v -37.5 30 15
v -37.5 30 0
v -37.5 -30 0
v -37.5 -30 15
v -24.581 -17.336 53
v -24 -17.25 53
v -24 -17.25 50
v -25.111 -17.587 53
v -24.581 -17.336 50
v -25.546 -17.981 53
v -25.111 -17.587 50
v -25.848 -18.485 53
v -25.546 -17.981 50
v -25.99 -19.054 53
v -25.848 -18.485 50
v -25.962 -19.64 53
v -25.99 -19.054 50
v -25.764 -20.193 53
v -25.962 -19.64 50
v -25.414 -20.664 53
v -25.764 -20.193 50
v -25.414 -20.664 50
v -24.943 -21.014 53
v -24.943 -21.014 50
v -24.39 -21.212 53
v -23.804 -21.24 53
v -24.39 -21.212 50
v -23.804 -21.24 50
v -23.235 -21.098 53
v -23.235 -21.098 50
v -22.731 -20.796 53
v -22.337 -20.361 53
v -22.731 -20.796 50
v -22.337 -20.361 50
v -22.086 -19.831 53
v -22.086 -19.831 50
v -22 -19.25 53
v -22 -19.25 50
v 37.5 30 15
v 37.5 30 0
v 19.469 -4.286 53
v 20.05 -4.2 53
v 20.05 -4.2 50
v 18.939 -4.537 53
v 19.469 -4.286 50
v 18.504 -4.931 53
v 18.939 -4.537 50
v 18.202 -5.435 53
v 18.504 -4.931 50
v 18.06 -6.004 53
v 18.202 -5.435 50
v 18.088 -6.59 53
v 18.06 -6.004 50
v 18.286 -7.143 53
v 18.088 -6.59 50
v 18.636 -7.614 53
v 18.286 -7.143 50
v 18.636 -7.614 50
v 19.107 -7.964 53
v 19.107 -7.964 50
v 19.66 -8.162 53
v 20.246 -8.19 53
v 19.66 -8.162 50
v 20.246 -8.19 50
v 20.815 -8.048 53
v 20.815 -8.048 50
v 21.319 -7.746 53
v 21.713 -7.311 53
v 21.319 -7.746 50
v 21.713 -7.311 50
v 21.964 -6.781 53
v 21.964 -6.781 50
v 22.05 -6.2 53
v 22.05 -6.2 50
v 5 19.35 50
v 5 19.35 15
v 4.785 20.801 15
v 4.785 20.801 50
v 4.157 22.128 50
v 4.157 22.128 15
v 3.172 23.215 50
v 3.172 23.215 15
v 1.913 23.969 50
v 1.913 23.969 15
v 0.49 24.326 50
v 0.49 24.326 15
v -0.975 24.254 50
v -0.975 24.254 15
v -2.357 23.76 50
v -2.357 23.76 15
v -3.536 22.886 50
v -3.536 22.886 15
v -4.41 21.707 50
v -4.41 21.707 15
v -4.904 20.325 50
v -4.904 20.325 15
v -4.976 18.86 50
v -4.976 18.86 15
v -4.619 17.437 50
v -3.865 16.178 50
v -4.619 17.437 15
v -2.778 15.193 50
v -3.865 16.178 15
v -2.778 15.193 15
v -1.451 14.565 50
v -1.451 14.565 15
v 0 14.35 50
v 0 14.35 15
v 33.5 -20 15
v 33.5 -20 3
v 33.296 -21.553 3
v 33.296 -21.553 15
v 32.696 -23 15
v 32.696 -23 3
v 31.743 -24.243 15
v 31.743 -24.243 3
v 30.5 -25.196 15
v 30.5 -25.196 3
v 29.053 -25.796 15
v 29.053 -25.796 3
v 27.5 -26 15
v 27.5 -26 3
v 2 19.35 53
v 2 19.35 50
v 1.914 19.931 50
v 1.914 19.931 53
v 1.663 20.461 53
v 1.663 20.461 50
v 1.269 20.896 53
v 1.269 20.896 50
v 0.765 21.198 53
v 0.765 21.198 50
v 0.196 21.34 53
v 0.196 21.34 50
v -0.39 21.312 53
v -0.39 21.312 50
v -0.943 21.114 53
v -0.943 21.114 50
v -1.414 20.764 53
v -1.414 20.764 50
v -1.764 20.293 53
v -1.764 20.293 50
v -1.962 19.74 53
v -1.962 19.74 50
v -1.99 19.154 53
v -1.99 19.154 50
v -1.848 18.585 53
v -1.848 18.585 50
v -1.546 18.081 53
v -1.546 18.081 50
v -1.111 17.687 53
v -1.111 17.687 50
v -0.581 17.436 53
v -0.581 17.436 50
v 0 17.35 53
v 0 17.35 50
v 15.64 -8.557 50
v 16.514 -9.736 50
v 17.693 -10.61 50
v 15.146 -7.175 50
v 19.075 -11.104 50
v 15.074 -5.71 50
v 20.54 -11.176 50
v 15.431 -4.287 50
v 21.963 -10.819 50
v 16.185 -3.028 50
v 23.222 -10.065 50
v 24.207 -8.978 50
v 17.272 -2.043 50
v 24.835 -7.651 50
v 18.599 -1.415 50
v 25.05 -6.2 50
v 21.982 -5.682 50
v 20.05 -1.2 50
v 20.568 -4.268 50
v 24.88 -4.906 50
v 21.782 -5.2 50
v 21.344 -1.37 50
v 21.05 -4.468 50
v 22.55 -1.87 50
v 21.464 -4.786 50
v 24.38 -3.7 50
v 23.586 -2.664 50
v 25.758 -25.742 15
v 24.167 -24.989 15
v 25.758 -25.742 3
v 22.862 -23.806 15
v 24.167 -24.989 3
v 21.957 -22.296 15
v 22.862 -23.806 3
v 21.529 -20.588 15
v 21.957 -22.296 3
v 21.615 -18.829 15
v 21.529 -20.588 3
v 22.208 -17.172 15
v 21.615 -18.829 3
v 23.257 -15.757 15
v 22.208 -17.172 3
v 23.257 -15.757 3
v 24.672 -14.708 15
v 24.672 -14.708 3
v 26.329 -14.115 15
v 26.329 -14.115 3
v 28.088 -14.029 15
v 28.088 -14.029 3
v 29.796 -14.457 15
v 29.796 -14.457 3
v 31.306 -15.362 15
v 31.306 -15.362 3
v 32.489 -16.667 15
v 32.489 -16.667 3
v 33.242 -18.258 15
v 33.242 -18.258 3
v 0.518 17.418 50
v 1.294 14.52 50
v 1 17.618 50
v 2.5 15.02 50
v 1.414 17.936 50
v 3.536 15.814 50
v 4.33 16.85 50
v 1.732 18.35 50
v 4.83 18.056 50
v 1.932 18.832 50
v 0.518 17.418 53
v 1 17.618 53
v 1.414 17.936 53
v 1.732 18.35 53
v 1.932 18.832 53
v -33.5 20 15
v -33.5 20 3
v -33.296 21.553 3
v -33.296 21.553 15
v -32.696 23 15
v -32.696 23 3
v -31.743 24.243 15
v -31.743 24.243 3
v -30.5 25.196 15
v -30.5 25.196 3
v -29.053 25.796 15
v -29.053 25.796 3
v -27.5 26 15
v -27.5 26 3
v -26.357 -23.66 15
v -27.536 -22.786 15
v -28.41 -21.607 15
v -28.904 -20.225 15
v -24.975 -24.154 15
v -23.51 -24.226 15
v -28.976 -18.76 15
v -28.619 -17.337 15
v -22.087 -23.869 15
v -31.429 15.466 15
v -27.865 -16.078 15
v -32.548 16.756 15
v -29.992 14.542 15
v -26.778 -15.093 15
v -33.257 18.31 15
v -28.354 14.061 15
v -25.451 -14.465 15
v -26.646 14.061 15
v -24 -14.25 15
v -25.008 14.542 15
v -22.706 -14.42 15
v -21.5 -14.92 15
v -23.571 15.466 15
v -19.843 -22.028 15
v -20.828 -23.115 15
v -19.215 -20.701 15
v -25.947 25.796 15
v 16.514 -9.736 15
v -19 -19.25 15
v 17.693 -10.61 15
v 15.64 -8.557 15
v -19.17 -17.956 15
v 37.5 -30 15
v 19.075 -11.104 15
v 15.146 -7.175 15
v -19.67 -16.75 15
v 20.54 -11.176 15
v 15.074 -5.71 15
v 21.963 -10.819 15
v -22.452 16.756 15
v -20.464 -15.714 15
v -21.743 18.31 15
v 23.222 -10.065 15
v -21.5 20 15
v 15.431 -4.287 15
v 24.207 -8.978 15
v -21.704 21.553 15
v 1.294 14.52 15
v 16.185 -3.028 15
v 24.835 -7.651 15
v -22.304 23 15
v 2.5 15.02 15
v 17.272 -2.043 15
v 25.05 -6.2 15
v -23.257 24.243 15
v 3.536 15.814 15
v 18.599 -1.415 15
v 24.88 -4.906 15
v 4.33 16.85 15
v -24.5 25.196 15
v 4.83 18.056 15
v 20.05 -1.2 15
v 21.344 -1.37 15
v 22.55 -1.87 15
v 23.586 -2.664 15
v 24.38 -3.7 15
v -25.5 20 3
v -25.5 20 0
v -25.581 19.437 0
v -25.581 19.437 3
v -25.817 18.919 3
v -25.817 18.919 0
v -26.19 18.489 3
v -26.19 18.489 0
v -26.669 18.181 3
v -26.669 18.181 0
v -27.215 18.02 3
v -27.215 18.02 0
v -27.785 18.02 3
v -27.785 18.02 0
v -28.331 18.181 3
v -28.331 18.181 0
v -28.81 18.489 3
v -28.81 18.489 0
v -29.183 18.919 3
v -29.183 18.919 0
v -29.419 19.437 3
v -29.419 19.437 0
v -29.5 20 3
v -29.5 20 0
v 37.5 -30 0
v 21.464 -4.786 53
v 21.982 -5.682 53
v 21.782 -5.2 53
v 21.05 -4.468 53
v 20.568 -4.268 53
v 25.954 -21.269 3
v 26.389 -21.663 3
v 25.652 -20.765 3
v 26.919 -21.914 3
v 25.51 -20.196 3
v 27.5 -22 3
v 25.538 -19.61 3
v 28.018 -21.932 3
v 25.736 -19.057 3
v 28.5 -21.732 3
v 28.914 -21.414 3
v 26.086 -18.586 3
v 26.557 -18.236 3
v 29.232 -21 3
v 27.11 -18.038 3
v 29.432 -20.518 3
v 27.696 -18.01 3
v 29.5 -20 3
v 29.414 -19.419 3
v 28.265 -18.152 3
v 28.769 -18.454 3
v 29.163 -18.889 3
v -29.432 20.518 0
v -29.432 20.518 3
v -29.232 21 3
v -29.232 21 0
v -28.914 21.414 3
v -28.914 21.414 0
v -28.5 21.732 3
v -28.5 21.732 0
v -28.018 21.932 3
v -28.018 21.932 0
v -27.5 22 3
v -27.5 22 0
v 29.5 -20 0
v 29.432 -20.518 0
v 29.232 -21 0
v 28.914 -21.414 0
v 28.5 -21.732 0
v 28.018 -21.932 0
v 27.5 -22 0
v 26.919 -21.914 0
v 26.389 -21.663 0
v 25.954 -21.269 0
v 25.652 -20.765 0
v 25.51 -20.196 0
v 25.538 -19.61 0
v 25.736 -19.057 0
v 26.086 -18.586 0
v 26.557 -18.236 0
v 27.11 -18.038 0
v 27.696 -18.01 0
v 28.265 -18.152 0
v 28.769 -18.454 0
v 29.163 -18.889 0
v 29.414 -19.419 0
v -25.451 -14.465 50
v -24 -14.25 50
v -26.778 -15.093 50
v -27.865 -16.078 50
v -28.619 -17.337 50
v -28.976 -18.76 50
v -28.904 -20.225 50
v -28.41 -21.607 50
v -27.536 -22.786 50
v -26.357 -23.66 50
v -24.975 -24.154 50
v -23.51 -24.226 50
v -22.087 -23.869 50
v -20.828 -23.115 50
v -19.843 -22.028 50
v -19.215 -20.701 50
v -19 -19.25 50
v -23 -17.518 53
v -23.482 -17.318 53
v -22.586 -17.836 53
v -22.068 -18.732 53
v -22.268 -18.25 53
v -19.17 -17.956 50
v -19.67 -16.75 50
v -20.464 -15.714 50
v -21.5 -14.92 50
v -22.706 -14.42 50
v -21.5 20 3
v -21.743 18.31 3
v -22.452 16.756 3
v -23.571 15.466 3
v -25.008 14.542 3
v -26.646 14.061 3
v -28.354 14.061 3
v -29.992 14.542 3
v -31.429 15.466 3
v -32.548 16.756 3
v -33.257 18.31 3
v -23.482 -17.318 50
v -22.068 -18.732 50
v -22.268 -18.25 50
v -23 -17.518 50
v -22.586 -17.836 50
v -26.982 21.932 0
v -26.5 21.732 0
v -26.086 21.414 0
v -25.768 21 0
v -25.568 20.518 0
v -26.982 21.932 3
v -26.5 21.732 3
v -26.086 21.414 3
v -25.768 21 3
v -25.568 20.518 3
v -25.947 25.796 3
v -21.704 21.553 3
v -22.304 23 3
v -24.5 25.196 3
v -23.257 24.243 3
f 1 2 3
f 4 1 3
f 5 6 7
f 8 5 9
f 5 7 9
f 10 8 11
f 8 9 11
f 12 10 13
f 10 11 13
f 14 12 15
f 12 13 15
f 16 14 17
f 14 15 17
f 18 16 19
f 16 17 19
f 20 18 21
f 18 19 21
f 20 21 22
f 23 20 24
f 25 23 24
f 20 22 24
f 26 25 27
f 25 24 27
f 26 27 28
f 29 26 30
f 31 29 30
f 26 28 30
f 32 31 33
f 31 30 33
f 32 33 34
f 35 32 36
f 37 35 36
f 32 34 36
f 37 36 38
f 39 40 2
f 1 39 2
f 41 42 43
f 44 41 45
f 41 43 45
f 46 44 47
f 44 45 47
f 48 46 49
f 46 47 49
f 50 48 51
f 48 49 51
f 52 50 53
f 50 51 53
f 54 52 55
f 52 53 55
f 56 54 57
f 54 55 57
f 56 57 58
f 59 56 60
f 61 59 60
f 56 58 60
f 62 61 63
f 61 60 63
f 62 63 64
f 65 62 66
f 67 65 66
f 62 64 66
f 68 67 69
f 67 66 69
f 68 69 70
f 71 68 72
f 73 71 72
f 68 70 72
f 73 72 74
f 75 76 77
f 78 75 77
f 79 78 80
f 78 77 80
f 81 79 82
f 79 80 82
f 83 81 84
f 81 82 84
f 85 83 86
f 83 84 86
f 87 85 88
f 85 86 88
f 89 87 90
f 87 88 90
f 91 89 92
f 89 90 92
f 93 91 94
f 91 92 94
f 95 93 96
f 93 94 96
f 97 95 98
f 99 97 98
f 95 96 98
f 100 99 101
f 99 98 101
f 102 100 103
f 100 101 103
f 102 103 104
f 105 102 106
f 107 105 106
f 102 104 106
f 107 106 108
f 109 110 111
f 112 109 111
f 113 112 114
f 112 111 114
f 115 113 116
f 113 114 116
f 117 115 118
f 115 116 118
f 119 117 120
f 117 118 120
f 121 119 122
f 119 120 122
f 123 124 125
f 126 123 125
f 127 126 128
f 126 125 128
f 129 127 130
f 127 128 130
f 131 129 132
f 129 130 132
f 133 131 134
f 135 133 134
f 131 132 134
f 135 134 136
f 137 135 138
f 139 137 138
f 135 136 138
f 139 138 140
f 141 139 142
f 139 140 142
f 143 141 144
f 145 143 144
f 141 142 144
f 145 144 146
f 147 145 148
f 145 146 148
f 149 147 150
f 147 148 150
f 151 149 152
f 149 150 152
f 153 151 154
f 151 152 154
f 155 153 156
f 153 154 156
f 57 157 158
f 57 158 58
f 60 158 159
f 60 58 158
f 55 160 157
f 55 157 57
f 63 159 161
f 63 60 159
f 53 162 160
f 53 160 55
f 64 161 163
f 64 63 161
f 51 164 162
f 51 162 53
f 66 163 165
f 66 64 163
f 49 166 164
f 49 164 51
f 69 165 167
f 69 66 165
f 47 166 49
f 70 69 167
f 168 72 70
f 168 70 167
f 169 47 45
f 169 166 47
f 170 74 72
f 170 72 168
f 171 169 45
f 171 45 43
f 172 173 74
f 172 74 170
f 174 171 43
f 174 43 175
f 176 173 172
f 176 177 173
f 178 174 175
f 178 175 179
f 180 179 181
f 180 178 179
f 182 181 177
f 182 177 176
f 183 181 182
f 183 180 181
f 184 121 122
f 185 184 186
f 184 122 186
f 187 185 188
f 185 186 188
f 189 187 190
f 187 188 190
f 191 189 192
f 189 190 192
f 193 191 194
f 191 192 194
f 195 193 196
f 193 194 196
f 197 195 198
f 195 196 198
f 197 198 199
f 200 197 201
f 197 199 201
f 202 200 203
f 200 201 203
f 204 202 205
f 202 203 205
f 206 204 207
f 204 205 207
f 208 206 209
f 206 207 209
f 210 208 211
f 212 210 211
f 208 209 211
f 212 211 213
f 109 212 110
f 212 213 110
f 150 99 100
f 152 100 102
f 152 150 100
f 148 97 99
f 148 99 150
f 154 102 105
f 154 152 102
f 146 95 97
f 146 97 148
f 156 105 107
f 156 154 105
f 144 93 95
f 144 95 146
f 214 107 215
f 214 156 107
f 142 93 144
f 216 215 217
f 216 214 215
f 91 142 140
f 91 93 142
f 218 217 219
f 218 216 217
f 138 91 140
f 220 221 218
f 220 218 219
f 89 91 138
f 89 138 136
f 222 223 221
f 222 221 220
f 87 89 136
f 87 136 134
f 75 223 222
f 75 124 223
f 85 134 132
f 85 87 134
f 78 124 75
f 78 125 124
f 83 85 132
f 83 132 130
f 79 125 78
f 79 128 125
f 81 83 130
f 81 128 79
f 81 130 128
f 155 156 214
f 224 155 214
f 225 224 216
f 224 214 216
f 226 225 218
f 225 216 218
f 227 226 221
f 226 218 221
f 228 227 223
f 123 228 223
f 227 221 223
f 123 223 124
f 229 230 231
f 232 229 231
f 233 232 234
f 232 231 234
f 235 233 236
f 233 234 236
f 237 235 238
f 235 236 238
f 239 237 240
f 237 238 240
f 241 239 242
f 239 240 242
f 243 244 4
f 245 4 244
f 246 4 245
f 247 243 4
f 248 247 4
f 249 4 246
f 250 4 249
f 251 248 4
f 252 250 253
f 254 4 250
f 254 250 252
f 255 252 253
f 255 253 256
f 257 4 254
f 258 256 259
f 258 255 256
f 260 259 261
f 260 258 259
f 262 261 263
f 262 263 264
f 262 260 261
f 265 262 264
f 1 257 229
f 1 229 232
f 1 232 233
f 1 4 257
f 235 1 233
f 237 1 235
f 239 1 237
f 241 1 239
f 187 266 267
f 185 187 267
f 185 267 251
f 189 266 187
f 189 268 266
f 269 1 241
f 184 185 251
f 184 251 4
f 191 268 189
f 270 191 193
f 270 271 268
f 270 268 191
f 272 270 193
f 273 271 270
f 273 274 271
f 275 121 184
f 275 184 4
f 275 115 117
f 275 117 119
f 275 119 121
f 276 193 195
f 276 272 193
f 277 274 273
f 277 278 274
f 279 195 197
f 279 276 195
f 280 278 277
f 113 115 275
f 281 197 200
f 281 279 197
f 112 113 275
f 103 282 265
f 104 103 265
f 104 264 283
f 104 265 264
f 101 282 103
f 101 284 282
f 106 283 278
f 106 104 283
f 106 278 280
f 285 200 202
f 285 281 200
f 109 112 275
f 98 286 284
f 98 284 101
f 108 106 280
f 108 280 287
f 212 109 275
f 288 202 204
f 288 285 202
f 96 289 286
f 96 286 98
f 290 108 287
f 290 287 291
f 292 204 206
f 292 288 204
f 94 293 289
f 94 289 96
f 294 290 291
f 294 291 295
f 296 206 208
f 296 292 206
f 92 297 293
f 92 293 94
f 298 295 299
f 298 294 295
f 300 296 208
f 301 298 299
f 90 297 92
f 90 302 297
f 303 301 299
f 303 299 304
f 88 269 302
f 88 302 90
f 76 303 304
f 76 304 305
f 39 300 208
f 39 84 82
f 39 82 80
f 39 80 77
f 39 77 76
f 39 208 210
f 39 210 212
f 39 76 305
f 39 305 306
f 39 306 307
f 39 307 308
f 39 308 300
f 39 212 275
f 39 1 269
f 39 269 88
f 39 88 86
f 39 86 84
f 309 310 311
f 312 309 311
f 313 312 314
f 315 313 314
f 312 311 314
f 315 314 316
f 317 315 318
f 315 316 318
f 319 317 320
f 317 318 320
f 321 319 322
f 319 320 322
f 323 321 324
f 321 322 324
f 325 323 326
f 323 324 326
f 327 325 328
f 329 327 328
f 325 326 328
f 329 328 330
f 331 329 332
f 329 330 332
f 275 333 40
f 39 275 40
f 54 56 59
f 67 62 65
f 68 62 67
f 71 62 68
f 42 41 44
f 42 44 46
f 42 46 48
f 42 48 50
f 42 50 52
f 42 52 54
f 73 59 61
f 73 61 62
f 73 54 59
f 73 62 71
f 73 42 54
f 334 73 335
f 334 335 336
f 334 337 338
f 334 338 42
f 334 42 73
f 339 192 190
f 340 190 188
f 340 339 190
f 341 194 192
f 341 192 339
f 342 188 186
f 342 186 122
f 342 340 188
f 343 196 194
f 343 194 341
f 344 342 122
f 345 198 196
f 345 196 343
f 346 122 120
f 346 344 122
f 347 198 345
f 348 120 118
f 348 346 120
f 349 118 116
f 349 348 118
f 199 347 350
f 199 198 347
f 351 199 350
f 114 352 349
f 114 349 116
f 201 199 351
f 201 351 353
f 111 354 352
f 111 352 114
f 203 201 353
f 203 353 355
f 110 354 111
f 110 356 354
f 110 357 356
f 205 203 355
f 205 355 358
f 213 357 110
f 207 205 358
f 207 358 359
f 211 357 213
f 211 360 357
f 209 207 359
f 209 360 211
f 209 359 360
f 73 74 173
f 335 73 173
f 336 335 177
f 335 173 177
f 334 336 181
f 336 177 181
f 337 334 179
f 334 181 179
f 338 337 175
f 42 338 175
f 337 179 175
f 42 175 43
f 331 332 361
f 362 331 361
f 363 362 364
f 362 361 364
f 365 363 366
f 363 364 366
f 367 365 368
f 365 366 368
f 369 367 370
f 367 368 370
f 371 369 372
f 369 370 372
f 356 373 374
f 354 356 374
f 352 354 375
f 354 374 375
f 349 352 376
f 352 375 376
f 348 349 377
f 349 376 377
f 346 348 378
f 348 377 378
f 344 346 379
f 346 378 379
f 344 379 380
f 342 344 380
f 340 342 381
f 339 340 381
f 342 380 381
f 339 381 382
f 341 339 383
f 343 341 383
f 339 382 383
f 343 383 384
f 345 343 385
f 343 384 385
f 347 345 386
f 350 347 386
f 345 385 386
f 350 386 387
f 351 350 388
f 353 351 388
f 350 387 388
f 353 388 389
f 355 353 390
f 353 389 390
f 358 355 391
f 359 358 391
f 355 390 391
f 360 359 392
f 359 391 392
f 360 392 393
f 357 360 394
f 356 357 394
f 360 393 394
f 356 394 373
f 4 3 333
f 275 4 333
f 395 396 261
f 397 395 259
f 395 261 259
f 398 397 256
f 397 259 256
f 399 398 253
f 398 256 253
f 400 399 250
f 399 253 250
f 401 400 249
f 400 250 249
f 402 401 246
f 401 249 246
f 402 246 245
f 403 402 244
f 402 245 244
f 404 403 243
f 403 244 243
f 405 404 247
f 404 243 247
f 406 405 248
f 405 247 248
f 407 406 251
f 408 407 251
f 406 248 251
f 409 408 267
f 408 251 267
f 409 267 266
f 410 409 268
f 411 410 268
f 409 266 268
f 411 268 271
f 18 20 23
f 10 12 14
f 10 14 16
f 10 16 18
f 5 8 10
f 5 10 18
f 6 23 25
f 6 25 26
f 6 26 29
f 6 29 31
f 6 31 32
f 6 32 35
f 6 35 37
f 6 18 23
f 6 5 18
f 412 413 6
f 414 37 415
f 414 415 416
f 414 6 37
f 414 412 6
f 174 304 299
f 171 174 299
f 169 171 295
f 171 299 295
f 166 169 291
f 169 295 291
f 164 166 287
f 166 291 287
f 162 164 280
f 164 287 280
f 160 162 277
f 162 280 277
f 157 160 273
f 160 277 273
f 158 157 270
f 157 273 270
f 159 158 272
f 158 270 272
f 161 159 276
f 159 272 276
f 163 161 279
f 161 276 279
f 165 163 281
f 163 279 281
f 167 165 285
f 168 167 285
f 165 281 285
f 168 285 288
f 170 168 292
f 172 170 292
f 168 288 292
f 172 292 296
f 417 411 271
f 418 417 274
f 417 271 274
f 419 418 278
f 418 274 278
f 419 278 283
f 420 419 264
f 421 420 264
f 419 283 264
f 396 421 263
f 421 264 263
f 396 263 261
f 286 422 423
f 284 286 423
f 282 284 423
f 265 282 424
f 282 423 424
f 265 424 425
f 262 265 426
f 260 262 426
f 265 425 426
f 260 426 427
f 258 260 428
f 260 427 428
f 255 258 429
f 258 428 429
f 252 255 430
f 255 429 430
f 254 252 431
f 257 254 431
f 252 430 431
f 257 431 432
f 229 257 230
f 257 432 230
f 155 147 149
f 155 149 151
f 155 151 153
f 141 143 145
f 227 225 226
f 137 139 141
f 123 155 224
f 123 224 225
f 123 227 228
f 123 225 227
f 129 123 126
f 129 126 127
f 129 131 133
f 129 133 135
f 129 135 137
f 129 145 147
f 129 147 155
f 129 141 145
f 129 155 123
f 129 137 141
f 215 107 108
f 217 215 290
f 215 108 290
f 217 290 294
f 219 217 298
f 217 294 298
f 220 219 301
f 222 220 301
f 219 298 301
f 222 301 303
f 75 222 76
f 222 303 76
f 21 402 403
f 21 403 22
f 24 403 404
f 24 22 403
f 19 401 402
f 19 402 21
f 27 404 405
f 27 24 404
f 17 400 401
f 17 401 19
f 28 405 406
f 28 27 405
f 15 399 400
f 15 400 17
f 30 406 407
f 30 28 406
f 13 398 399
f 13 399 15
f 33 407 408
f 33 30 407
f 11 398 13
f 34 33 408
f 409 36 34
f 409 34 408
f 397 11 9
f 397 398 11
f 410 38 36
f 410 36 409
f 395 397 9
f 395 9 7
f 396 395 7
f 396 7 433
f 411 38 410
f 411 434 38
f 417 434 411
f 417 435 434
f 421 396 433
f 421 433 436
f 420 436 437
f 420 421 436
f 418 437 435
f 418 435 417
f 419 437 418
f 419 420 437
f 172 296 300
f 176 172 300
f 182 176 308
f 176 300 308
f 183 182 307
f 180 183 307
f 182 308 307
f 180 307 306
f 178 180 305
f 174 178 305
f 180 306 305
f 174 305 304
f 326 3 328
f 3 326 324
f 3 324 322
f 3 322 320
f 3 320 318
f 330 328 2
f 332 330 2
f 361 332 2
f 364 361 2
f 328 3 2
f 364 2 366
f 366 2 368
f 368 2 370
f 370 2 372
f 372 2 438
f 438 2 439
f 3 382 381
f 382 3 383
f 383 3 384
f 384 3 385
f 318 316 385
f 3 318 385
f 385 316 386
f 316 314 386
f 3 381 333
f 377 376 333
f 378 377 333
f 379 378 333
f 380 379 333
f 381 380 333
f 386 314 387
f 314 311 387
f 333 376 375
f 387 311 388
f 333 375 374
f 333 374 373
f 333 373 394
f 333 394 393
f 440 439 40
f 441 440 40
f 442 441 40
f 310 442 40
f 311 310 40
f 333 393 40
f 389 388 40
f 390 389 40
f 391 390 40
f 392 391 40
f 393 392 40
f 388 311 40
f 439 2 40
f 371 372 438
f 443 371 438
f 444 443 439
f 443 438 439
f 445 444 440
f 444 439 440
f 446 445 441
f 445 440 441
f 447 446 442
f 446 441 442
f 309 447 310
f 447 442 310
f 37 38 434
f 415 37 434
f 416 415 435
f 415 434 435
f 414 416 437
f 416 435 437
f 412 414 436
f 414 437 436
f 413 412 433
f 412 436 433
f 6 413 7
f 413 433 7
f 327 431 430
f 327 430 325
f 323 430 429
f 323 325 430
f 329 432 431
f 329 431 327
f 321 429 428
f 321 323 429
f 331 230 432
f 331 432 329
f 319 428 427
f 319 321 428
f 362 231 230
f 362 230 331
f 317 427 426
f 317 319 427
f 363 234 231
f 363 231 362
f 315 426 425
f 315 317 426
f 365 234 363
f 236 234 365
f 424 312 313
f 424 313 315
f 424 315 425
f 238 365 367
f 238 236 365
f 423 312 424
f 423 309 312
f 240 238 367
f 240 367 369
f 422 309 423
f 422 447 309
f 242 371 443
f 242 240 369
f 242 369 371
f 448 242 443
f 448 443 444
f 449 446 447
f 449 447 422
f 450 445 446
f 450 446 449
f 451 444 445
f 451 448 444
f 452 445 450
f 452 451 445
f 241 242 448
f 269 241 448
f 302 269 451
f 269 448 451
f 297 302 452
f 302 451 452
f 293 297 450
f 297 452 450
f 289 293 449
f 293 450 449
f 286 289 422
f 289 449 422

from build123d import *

# Parameters (mm, degrees)
F1_DEPTH = 15
F2_DEPTH = 3
F3_DEPTH = 50
F4_DEPTH = 53


with BuildPart() as f1:
    # F0 (on Top) → F1 (new body)
    with BuildSketch(Plane.XY):
        with BuildLine():
            Line((37.5, -20), (37.5, 30))
            Line((37.5, 30), (-27.5, 30))
            Line((-27.5, 30), (-27.5, 26))
            ThreePointArc((-27.5, 26), (-23.2573593129, 24.2426406871), (-21.5, 20))
            ThreePointArc((-21.5, 20), (-27.5, 14), (-33.5, 20))
            Line((-33.5, 20), (-37.5, 20))
            Line((-37.5, 20), (-37.5, -30))
            Line((-37.5, -30), (27.5, -30))
            Line((27.5, -30), (27.5, -26))
            ThreePointArc((27.5, -26), (23.2573593129, -15.7573593129), (33.5, -20))
            Line((33.5, -20), (37.5, -20))
        make_face()
        with BuildLine():
            ThreePointArc((-19, -19.25), (-27.5355339059, -22.7855339059), (-24, -14.25))
            ThreePointArc((-24, -14.25), (-20.4644660941, -15.7144660941), (-19, -19.25))
        make_face(mode=Mode.SUBTRACT)
        with BuildLine():
            ThreePointArc((25.05, -6.2), (16.5144660941, -9.7355339059), (20.05, -1.2))
            ThreePointArc((20.05, -1.2), (23.5855339059, -2.6644660941), (25.05, -6.2))
        make_face(mode=Mode.SUBTRACT)
        with BuildLine():
            ThreePointArc((5, 19.35), (3.5355339059, 15.8144660941), (0, 14.35))
            ThreePointArc((0, 14.35), (-3.5355339059, 22.8855339059), (5, 19.35))
        make_face(mode=Mode.SUBTRACT)
        with BuildLine():
            Line((-27.5, 26), (-27.5, 30))
            Line((-27.5, 30), (-37.5, 30))
            Line((-37.5, 30), (-37.5, 20))
            Line((-37.5, 20), (-33.5, 20))
            ThreePointArc((-33.5, 20), (-31.7426406871, 24.2426406871), (-27.5, 26))
        make_face()
        with BuildLine():
            Line((37.5, -30), (37.5, -20))
            Line((37.5, -20), (33.5, -20))
            ThreePointArc((33.5, -20), (31.7426406871, -24.2426406871), (27.5, -26))
            Line((27.5, -26), (27.5, -30))
            Line((27.5, -30), (37.5, -30))
        make_face()
    extrude(amount=F1_DEPTH)

    # F0 (on Top) → F2 (join)
    with BuildSketch(Plane.XY):
        with BuildLine():
            ThreePointArc((-21.5, 20), (-23.2573593129, 24.2426406871), (-27.5, 26))
            Line((-27.5, 26), (-27.5, 22))
            ThreePointArc((-27.5, 22), (-26.0857864376, 21.4142135624), (-25.5, 20))
            ThreePointArc((-25.5, 20), (-27.5, 18), (-29.5, 20))
            Line((-29.5, 20), (-33.5, 20))
            ThreePointArc((-33.5, 20), (-27.5, 14), (-21.5, 20))
        make_face()
        with BuildLine():
            Line((-27.5, 22), (-27.5, 26))
            ThreePointArc((-27.5, 26), (-31.7426406871, 24.2426406871), (-33.5, 20))
            Line((-33.5, 20), (-29.5, 20))
            ThreePointArc((-29.5, 20), (-28.9142135624, 21.4142135624), (-27.5, 22))
        make_face()
        with BuildLine():
            ThreePointArc((27.5, -26), (31.7426406871, -24.2426406871), (33.5, -20))
            Line((33.5, -20), (29.5, -20))
            ThreePointArc((29.5, -20), (28.9142135624, -21.4142135624), (27.5, -22))
            Line((27.5, -22), (27.5, -26))
        make_face()
        with BuildLine():
            Line((29.5, -20), (33.5, -20))
            ThreePointArc((33.5, -20), (23.2573593129, -15.7573593129), (27.5, -26))
            Line((27.5, -26), (27.5, -22))
            ThreePointArc((27.5, -22), (26.0857864376, -18.5857864376), (29.5, -20))
        make_face()
    extrude(amount=F2_DEPTH)

    # F0 (on Top) → F3 (join)
    with BuildSketch(Plane.XY):
        with BuildLine():
            ThreePointArc((5, 19.35), (-3.5355339059, 22.8855339059), (0, 14.35))
            ThreePointArc((0, 14.35), (3.5355339059, 15.8144660941), (5, 19.35))
        make_face()
        with BuildLine():
            ThreePointArc((2, 19.35), (1.4142135624, 17.9357864376), (0, 17.35))
            ThreePointArc((0, 17.35), (-1.4142135624, 20.7642135624), (2, 19.35))
        make_face(mode=Mode.SUBTRACT)
        with BuildLine():
            ThreePointArc((-19, -19.25), (-20.4644660941, -15.7144660941), (-24, -14.25))
            ThreePointArc((-24, -14.25), (-27.5355339059, -22.7855339059), (-19, -19.25))
        make_face()
        with BuildLine():
            ThreePointArc((-22, -19.25), (-25.4142135624, -20.6642135624), (-24, -17.25))
            ThreePointArc((-24, -17.25), (-22.5857864376, -17.8357864376), (-22, -19.25))
        make_face(mode=Mode.SUBTRACT)
        with BuildLine():
            ThreePointArc((25.05, -6.2), (23.5855339059, -2.6644660941), (20.05, -1.2))
            ThreePointArc((20.05, -1.2), (16.5144660941, -9.7355339059), (25.05, -6.2))
        make_face()
        with BuildLine():
            ThreePointArc((22.05, -6.2), (18.6357864376, -7.6142135624), (20.05, -4.2))
            ThreePointArc((20.05, -4.2), (21.4642135624, -4.7857864376), (22.05, -6.2))
        make_face(mode=Mode.SUBTRACT)
    extrude(amount=F3_DEPTH)

    # F0 (on Top) → F4 (join)
    with BuildSketch(Plane.XY):
        with BuildLine():
            ThreePointArc((2, 19.35), (-1.4142135624, 20.7642135624), (0, 17.35))
            ThreePointArc((0, 17.35), (1.4142135624, 17.9357864376), (2, 19.35))
        make_face()
        with BuildLine():
            ThreePointArc((-22, -19.25), (-22.5857864376, -17.8357864376), (-24, -17.25))
            ThreePointArc((-24, -17.25), (-25.4142135624, -20.6642135624), (-22, -19.25))
        make_face()
        with BuildLine():
            ThreePointArc((22.05, -6.2), (21.4642135624, -4.7857864376), (20.05, -4.2))
            ThreePointArc((20.05, -4.2), (18.6357864376, -7.6142135624), (22.05, -6.2))
        make_face()
    extrude(amount=F4_DEPTH)


solid = f1.part
